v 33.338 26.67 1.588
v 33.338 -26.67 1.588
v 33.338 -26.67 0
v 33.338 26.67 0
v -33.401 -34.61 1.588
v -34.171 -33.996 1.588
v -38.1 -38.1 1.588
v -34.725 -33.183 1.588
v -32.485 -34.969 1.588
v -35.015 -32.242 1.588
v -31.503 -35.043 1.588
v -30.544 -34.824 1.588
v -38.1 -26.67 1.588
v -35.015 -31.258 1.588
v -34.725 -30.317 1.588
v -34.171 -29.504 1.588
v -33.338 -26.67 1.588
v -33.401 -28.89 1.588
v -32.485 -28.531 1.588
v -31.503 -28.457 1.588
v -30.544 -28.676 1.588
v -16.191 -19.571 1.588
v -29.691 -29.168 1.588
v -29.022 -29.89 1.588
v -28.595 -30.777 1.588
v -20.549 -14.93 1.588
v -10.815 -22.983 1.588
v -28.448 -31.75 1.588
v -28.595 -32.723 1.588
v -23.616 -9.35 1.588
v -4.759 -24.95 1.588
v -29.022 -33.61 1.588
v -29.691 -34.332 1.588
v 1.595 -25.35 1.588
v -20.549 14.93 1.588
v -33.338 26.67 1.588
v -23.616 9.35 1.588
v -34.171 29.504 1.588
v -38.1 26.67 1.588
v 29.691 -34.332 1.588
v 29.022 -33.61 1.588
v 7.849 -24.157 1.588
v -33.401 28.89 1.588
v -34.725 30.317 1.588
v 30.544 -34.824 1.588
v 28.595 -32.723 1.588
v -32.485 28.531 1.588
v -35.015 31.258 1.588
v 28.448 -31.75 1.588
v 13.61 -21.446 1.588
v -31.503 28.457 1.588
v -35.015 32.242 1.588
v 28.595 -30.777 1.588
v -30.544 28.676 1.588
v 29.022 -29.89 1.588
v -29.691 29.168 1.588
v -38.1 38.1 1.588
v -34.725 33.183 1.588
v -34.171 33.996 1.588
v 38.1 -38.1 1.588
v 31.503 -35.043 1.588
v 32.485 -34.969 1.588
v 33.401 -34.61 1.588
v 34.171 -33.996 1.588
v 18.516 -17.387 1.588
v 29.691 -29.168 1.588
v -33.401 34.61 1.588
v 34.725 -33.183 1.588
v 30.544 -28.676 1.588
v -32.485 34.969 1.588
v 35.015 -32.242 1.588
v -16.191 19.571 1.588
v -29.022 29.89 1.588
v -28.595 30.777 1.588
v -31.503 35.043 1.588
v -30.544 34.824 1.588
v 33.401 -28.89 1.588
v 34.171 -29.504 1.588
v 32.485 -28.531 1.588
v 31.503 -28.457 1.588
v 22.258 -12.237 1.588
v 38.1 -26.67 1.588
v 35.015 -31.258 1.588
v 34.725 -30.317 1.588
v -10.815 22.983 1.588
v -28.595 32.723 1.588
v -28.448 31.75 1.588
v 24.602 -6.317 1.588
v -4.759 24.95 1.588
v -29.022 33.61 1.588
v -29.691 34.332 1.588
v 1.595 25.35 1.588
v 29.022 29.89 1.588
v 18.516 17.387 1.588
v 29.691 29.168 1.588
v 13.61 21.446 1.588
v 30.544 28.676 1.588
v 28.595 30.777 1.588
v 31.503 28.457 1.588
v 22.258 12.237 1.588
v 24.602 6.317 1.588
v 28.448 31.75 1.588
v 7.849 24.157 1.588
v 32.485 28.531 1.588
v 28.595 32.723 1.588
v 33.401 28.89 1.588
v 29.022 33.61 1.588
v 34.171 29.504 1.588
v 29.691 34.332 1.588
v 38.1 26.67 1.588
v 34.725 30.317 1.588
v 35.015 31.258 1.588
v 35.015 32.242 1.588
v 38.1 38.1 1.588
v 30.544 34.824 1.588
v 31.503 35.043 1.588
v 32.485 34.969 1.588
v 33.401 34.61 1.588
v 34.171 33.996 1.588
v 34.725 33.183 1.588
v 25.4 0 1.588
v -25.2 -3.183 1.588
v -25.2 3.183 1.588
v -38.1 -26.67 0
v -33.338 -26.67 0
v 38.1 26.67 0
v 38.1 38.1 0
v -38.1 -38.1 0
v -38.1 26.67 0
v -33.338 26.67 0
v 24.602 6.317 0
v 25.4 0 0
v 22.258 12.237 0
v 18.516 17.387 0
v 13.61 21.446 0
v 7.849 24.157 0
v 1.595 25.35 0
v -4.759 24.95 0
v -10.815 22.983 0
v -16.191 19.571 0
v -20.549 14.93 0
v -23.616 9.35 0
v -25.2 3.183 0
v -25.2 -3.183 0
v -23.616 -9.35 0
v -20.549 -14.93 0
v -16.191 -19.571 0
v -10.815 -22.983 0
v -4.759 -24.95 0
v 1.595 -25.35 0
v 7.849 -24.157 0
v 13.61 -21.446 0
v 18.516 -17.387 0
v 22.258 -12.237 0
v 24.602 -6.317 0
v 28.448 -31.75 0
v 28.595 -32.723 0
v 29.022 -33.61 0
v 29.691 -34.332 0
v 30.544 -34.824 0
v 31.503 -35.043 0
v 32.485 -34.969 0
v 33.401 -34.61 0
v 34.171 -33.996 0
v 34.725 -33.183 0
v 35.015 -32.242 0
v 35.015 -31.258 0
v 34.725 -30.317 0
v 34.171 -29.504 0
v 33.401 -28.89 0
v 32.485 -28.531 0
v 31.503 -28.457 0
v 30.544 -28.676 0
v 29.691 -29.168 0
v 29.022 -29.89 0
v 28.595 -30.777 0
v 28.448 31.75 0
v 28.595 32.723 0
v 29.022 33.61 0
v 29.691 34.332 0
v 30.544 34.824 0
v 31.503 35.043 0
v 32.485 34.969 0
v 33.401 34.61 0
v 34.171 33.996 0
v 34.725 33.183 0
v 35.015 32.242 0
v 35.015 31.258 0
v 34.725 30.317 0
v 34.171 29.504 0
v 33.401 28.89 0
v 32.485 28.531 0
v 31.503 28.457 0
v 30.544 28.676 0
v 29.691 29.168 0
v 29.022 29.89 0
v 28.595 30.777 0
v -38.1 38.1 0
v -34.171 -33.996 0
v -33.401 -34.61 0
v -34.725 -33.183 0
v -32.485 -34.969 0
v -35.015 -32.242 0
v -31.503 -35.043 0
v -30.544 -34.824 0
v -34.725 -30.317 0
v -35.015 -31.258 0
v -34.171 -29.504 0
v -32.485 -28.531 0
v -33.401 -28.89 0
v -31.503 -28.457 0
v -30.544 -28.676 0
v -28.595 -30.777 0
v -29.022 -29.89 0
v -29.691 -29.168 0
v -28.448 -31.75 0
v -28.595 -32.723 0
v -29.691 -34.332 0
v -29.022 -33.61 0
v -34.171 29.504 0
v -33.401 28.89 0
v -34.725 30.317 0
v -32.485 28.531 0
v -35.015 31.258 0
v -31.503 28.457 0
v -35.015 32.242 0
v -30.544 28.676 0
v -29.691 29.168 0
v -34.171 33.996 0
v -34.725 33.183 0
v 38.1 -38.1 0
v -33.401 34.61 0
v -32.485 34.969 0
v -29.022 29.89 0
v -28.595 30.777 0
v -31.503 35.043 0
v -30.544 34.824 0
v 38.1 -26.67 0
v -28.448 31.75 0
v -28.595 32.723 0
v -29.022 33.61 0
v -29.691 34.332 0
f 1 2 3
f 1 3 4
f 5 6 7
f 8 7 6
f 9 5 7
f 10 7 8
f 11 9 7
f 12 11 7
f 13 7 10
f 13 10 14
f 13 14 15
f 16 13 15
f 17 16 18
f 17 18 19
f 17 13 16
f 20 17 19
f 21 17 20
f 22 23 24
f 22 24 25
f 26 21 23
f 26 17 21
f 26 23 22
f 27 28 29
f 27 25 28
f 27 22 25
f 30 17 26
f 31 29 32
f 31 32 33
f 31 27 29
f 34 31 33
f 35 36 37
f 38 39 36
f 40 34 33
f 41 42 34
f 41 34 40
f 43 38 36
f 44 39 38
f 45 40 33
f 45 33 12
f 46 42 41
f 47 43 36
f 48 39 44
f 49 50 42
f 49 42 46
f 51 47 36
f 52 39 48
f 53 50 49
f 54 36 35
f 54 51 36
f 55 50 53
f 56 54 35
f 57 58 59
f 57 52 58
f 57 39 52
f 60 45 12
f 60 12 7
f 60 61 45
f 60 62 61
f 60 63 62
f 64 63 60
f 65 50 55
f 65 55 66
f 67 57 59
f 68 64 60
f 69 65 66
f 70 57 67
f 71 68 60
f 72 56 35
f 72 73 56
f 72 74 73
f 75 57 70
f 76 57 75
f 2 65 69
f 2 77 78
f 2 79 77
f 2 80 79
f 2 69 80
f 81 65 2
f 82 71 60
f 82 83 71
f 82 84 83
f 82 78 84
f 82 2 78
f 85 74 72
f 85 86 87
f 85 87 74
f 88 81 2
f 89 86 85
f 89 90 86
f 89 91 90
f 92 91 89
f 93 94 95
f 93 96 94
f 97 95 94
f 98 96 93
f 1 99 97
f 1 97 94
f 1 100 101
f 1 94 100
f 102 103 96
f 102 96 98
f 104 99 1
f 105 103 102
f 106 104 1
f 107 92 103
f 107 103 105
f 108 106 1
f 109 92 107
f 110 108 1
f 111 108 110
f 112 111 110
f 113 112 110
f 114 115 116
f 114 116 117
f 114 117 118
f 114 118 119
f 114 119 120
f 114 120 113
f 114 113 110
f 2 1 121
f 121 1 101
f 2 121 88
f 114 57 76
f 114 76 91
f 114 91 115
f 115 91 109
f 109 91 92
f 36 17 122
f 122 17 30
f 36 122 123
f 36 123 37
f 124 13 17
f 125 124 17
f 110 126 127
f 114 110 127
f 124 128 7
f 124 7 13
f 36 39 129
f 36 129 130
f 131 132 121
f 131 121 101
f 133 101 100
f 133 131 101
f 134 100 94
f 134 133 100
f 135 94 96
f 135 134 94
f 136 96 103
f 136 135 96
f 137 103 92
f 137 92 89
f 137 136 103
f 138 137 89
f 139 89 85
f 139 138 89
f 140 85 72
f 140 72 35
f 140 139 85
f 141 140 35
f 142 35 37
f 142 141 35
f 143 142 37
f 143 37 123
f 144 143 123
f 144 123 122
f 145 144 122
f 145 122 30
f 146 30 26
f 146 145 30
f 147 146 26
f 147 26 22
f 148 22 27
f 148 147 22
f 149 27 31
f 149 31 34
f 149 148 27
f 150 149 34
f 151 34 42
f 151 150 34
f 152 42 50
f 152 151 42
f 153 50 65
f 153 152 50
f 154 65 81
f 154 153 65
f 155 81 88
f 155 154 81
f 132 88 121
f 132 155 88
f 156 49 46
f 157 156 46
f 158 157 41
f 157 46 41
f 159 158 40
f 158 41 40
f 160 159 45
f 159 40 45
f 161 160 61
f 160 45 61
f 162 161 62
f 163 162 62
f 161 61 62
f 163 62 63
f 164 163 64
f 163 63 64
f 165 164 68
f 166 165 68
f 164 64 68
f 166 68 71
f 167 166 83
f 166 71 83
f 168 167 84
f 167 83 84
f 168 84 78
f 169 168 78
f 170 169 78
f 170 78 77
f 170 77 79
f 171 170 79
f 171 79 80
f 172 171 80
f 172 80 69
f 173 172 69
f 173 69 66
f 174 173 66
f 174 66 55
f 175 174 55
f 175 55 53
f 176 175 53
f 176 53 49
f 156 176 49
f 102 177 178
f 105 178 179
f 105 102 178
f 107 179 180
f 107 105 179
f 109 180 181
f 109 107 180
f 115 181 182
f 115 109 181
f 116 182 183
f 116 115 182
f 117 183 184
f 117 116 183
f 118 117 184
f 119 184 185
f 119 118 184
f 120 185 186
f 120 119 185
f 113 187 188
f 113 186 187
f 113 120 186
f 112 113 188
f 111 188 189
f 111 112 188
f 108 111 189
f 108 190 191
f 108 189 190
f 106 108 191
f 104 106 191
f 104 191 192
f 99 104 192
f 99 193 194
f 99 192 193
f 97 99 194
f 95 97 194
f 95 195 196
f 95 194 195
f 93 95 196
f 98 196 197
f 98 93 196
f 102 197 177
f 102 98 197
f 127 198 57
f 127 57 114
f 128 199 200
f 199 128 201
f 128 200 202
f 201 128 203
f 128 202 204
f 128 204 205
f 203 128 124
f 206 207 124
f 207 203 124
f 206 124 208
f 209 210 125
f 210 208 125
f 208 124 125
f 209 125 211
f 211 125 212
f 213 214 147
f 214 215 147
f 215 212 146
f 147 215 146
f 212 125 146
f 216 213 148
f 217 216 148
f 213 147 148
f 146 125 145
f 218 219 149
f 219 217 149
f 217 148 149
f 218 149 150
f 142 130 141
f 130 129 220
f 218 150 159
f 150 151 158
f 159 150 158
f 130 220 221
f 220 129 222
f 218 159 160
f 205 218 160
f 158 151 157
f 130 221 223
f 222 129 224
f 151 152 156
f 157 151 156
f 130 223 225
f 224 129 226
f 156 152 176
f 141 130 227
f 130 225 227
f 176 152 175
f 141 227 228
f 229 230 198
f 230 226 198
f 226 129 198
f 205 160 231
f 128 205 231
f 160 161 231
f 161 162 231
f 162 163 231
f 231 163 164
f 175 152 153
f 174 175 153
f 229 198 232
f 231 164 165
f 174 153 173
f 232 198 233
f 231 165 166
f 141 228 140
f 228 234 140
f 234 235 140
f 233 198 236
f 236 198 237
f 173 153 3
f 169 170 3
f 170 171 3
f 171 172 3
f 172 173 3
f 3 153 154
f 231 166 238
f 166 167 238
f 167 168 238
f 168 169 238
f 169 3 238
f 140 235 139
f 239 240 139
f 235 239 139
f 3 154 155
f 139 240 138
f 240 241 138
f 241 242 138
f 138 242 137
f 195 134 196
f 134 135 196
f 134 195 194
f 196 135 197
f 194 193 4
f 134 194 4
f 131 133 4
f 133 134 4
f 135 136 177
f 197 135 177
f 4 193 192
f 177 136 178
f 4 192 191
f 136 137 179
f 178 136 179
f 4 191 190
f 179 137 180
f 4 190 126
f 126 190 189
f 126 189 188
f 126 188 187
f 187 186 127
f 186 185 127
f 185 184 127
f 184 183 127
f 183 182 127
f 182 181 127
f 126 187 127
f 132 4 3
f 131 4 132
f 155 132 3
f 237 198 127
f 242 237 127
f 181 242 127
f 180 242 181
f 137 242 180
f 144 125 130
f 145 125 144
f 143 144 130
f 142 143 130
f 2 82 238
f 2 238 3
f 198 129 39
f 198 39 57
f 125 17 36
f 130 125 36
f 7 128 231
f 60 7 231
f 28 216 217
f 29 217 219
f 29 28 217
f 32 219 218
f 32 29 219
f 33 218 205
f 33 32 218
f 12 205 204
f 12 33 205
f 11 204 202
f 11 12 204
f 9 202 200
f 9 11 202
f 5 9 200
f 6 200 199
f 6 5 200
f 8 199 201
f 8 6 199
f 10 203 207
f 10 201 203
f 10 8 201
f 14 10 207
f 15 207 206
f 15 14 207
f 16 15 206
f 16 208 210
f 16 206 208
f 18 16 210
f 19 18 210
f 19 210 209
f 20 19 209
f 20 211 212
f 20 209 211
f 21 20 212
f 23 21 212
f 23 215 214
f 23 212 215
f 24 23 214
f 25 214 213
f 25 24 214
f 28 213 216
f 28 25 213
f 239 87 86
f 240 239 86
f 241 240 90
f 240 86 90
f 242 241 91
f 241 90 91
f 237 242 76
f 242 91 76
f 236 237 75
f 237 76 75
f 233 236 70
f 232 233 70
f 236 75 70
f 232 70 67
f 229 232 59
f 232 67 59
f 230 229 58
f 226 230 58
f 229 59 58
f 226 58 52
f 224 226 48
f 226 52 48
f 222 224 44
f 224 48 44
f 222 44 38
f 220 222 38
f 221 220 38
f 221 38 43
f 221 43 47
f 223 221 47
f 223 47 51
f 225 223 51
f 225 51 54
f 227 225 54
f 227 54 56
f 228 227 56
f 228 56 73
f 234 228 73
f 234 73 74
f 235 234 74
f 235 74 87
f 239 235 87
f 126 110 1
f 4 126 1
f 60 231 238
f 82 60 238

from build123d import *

# Parameters (mm, degrees)
SKETCH1_W               = 76.2
SKETCH1_H               = 76.2
SKETCH1_R               = 25.4
BOSS_EXTRUDE1_DEPTH     = 1.5875
SKETCH2_R               = 3.302
CUT_EXTRUDE1_DEPTH      = 3.175
MIRROR2_COPY_1_SKETCH_R = 3.302
MIRROR2_COPY_1_DEPTH    = 3.175
MIRROR2_COPY_2_SKETCH_R = 3.302
MIRROR2_COPY_2_DEPTH    = 3.175
SKETCH9_W               = 4.7625
SKETCH9_H               = 53.34
CUT_EXTRUDE3_DEPTH      = 54.904917737


with BuildPart() as part:
    # Sketch1 → Boss-Extrude1 (new body)
    with BuildSketch(Plane.XY):
        Rectangle(SKETCH1_W, SKETCH1_H)
        Circle(SKETCH1_R, mode=Mode.SUBTRACT)
    extrude(amount=BOSS_EXTRUDE1_DEPTH)

    # Sketch2 → Cut-Extrude1 (cut)
    with BuildSketch(Plane.XY.offset(1.5875)):
        with Locations((-31.75, 31.75)):
            Circle(SKETCH2_R)
    cut_extrude1 = extrude(amount=-CUT_EXTRUDE1_DEPTH, mode=Mode.SUBTRACT)

    # Mirror1: Cut-Extrude1 across plane
    add(cut_extrude1.mirror(Plane(origin=(0, 0, 0), x_dir=(0, 0, 1), z_dir=(1, 0, 0))), mode=Mode.SUBTRACT)

    # Mirror2 copy 1 sketch → Mirror2 copy 1 (cut)
    with BuildSketch(Plane(origin=(0, 0, 1.5875), x_dir=(-1, 0, 0), z_dir=(0, 0, 1))):
        with Locations((-31.75, 31.75)):
            Circle(MIRROR2_COPY_1_SKETCH_R)
    extrude(amount=-MIRROR2_COPY_1_DEPTH, mode=Mode.SUBTRACT)

    # Mirror2 copy 2 sketch → Mirror2 copy 2 (cut)
    with BuildSketch(Plane.XY.offset(1.5875)):
        with Locations((-31.75, -31.75)):
            Circle(MIRROR2_COPY_2_SKETCH_R)
    extrude(amount=-MIRROR2_COPY_2_DEPTH, mode=Mode.SUBTRACT)

    # Sketch9 → Cut-Extrude3 (cut, through all)
    with BuildSketch(Plane.XY.offset(1.5875)):
        with Locations((-35.71875, 0)):
            Rectangle(SKETCH9_W, SKETCH9_H)
    cut_extrude3 = extrude(amount=-CUT_EXTRUDE3_DEPTH, mode=Mode.SUBTRACT)

    # Mirror3: Cut-Extrude3 across plane
    add(cut_extrude3.mirror(Plane(origin=(0, 0, 0), x_dir=(0, 0, 1), z_dir=(1, 0, 0))), mode=Mode.SUBTRACT)


solid = part.part
